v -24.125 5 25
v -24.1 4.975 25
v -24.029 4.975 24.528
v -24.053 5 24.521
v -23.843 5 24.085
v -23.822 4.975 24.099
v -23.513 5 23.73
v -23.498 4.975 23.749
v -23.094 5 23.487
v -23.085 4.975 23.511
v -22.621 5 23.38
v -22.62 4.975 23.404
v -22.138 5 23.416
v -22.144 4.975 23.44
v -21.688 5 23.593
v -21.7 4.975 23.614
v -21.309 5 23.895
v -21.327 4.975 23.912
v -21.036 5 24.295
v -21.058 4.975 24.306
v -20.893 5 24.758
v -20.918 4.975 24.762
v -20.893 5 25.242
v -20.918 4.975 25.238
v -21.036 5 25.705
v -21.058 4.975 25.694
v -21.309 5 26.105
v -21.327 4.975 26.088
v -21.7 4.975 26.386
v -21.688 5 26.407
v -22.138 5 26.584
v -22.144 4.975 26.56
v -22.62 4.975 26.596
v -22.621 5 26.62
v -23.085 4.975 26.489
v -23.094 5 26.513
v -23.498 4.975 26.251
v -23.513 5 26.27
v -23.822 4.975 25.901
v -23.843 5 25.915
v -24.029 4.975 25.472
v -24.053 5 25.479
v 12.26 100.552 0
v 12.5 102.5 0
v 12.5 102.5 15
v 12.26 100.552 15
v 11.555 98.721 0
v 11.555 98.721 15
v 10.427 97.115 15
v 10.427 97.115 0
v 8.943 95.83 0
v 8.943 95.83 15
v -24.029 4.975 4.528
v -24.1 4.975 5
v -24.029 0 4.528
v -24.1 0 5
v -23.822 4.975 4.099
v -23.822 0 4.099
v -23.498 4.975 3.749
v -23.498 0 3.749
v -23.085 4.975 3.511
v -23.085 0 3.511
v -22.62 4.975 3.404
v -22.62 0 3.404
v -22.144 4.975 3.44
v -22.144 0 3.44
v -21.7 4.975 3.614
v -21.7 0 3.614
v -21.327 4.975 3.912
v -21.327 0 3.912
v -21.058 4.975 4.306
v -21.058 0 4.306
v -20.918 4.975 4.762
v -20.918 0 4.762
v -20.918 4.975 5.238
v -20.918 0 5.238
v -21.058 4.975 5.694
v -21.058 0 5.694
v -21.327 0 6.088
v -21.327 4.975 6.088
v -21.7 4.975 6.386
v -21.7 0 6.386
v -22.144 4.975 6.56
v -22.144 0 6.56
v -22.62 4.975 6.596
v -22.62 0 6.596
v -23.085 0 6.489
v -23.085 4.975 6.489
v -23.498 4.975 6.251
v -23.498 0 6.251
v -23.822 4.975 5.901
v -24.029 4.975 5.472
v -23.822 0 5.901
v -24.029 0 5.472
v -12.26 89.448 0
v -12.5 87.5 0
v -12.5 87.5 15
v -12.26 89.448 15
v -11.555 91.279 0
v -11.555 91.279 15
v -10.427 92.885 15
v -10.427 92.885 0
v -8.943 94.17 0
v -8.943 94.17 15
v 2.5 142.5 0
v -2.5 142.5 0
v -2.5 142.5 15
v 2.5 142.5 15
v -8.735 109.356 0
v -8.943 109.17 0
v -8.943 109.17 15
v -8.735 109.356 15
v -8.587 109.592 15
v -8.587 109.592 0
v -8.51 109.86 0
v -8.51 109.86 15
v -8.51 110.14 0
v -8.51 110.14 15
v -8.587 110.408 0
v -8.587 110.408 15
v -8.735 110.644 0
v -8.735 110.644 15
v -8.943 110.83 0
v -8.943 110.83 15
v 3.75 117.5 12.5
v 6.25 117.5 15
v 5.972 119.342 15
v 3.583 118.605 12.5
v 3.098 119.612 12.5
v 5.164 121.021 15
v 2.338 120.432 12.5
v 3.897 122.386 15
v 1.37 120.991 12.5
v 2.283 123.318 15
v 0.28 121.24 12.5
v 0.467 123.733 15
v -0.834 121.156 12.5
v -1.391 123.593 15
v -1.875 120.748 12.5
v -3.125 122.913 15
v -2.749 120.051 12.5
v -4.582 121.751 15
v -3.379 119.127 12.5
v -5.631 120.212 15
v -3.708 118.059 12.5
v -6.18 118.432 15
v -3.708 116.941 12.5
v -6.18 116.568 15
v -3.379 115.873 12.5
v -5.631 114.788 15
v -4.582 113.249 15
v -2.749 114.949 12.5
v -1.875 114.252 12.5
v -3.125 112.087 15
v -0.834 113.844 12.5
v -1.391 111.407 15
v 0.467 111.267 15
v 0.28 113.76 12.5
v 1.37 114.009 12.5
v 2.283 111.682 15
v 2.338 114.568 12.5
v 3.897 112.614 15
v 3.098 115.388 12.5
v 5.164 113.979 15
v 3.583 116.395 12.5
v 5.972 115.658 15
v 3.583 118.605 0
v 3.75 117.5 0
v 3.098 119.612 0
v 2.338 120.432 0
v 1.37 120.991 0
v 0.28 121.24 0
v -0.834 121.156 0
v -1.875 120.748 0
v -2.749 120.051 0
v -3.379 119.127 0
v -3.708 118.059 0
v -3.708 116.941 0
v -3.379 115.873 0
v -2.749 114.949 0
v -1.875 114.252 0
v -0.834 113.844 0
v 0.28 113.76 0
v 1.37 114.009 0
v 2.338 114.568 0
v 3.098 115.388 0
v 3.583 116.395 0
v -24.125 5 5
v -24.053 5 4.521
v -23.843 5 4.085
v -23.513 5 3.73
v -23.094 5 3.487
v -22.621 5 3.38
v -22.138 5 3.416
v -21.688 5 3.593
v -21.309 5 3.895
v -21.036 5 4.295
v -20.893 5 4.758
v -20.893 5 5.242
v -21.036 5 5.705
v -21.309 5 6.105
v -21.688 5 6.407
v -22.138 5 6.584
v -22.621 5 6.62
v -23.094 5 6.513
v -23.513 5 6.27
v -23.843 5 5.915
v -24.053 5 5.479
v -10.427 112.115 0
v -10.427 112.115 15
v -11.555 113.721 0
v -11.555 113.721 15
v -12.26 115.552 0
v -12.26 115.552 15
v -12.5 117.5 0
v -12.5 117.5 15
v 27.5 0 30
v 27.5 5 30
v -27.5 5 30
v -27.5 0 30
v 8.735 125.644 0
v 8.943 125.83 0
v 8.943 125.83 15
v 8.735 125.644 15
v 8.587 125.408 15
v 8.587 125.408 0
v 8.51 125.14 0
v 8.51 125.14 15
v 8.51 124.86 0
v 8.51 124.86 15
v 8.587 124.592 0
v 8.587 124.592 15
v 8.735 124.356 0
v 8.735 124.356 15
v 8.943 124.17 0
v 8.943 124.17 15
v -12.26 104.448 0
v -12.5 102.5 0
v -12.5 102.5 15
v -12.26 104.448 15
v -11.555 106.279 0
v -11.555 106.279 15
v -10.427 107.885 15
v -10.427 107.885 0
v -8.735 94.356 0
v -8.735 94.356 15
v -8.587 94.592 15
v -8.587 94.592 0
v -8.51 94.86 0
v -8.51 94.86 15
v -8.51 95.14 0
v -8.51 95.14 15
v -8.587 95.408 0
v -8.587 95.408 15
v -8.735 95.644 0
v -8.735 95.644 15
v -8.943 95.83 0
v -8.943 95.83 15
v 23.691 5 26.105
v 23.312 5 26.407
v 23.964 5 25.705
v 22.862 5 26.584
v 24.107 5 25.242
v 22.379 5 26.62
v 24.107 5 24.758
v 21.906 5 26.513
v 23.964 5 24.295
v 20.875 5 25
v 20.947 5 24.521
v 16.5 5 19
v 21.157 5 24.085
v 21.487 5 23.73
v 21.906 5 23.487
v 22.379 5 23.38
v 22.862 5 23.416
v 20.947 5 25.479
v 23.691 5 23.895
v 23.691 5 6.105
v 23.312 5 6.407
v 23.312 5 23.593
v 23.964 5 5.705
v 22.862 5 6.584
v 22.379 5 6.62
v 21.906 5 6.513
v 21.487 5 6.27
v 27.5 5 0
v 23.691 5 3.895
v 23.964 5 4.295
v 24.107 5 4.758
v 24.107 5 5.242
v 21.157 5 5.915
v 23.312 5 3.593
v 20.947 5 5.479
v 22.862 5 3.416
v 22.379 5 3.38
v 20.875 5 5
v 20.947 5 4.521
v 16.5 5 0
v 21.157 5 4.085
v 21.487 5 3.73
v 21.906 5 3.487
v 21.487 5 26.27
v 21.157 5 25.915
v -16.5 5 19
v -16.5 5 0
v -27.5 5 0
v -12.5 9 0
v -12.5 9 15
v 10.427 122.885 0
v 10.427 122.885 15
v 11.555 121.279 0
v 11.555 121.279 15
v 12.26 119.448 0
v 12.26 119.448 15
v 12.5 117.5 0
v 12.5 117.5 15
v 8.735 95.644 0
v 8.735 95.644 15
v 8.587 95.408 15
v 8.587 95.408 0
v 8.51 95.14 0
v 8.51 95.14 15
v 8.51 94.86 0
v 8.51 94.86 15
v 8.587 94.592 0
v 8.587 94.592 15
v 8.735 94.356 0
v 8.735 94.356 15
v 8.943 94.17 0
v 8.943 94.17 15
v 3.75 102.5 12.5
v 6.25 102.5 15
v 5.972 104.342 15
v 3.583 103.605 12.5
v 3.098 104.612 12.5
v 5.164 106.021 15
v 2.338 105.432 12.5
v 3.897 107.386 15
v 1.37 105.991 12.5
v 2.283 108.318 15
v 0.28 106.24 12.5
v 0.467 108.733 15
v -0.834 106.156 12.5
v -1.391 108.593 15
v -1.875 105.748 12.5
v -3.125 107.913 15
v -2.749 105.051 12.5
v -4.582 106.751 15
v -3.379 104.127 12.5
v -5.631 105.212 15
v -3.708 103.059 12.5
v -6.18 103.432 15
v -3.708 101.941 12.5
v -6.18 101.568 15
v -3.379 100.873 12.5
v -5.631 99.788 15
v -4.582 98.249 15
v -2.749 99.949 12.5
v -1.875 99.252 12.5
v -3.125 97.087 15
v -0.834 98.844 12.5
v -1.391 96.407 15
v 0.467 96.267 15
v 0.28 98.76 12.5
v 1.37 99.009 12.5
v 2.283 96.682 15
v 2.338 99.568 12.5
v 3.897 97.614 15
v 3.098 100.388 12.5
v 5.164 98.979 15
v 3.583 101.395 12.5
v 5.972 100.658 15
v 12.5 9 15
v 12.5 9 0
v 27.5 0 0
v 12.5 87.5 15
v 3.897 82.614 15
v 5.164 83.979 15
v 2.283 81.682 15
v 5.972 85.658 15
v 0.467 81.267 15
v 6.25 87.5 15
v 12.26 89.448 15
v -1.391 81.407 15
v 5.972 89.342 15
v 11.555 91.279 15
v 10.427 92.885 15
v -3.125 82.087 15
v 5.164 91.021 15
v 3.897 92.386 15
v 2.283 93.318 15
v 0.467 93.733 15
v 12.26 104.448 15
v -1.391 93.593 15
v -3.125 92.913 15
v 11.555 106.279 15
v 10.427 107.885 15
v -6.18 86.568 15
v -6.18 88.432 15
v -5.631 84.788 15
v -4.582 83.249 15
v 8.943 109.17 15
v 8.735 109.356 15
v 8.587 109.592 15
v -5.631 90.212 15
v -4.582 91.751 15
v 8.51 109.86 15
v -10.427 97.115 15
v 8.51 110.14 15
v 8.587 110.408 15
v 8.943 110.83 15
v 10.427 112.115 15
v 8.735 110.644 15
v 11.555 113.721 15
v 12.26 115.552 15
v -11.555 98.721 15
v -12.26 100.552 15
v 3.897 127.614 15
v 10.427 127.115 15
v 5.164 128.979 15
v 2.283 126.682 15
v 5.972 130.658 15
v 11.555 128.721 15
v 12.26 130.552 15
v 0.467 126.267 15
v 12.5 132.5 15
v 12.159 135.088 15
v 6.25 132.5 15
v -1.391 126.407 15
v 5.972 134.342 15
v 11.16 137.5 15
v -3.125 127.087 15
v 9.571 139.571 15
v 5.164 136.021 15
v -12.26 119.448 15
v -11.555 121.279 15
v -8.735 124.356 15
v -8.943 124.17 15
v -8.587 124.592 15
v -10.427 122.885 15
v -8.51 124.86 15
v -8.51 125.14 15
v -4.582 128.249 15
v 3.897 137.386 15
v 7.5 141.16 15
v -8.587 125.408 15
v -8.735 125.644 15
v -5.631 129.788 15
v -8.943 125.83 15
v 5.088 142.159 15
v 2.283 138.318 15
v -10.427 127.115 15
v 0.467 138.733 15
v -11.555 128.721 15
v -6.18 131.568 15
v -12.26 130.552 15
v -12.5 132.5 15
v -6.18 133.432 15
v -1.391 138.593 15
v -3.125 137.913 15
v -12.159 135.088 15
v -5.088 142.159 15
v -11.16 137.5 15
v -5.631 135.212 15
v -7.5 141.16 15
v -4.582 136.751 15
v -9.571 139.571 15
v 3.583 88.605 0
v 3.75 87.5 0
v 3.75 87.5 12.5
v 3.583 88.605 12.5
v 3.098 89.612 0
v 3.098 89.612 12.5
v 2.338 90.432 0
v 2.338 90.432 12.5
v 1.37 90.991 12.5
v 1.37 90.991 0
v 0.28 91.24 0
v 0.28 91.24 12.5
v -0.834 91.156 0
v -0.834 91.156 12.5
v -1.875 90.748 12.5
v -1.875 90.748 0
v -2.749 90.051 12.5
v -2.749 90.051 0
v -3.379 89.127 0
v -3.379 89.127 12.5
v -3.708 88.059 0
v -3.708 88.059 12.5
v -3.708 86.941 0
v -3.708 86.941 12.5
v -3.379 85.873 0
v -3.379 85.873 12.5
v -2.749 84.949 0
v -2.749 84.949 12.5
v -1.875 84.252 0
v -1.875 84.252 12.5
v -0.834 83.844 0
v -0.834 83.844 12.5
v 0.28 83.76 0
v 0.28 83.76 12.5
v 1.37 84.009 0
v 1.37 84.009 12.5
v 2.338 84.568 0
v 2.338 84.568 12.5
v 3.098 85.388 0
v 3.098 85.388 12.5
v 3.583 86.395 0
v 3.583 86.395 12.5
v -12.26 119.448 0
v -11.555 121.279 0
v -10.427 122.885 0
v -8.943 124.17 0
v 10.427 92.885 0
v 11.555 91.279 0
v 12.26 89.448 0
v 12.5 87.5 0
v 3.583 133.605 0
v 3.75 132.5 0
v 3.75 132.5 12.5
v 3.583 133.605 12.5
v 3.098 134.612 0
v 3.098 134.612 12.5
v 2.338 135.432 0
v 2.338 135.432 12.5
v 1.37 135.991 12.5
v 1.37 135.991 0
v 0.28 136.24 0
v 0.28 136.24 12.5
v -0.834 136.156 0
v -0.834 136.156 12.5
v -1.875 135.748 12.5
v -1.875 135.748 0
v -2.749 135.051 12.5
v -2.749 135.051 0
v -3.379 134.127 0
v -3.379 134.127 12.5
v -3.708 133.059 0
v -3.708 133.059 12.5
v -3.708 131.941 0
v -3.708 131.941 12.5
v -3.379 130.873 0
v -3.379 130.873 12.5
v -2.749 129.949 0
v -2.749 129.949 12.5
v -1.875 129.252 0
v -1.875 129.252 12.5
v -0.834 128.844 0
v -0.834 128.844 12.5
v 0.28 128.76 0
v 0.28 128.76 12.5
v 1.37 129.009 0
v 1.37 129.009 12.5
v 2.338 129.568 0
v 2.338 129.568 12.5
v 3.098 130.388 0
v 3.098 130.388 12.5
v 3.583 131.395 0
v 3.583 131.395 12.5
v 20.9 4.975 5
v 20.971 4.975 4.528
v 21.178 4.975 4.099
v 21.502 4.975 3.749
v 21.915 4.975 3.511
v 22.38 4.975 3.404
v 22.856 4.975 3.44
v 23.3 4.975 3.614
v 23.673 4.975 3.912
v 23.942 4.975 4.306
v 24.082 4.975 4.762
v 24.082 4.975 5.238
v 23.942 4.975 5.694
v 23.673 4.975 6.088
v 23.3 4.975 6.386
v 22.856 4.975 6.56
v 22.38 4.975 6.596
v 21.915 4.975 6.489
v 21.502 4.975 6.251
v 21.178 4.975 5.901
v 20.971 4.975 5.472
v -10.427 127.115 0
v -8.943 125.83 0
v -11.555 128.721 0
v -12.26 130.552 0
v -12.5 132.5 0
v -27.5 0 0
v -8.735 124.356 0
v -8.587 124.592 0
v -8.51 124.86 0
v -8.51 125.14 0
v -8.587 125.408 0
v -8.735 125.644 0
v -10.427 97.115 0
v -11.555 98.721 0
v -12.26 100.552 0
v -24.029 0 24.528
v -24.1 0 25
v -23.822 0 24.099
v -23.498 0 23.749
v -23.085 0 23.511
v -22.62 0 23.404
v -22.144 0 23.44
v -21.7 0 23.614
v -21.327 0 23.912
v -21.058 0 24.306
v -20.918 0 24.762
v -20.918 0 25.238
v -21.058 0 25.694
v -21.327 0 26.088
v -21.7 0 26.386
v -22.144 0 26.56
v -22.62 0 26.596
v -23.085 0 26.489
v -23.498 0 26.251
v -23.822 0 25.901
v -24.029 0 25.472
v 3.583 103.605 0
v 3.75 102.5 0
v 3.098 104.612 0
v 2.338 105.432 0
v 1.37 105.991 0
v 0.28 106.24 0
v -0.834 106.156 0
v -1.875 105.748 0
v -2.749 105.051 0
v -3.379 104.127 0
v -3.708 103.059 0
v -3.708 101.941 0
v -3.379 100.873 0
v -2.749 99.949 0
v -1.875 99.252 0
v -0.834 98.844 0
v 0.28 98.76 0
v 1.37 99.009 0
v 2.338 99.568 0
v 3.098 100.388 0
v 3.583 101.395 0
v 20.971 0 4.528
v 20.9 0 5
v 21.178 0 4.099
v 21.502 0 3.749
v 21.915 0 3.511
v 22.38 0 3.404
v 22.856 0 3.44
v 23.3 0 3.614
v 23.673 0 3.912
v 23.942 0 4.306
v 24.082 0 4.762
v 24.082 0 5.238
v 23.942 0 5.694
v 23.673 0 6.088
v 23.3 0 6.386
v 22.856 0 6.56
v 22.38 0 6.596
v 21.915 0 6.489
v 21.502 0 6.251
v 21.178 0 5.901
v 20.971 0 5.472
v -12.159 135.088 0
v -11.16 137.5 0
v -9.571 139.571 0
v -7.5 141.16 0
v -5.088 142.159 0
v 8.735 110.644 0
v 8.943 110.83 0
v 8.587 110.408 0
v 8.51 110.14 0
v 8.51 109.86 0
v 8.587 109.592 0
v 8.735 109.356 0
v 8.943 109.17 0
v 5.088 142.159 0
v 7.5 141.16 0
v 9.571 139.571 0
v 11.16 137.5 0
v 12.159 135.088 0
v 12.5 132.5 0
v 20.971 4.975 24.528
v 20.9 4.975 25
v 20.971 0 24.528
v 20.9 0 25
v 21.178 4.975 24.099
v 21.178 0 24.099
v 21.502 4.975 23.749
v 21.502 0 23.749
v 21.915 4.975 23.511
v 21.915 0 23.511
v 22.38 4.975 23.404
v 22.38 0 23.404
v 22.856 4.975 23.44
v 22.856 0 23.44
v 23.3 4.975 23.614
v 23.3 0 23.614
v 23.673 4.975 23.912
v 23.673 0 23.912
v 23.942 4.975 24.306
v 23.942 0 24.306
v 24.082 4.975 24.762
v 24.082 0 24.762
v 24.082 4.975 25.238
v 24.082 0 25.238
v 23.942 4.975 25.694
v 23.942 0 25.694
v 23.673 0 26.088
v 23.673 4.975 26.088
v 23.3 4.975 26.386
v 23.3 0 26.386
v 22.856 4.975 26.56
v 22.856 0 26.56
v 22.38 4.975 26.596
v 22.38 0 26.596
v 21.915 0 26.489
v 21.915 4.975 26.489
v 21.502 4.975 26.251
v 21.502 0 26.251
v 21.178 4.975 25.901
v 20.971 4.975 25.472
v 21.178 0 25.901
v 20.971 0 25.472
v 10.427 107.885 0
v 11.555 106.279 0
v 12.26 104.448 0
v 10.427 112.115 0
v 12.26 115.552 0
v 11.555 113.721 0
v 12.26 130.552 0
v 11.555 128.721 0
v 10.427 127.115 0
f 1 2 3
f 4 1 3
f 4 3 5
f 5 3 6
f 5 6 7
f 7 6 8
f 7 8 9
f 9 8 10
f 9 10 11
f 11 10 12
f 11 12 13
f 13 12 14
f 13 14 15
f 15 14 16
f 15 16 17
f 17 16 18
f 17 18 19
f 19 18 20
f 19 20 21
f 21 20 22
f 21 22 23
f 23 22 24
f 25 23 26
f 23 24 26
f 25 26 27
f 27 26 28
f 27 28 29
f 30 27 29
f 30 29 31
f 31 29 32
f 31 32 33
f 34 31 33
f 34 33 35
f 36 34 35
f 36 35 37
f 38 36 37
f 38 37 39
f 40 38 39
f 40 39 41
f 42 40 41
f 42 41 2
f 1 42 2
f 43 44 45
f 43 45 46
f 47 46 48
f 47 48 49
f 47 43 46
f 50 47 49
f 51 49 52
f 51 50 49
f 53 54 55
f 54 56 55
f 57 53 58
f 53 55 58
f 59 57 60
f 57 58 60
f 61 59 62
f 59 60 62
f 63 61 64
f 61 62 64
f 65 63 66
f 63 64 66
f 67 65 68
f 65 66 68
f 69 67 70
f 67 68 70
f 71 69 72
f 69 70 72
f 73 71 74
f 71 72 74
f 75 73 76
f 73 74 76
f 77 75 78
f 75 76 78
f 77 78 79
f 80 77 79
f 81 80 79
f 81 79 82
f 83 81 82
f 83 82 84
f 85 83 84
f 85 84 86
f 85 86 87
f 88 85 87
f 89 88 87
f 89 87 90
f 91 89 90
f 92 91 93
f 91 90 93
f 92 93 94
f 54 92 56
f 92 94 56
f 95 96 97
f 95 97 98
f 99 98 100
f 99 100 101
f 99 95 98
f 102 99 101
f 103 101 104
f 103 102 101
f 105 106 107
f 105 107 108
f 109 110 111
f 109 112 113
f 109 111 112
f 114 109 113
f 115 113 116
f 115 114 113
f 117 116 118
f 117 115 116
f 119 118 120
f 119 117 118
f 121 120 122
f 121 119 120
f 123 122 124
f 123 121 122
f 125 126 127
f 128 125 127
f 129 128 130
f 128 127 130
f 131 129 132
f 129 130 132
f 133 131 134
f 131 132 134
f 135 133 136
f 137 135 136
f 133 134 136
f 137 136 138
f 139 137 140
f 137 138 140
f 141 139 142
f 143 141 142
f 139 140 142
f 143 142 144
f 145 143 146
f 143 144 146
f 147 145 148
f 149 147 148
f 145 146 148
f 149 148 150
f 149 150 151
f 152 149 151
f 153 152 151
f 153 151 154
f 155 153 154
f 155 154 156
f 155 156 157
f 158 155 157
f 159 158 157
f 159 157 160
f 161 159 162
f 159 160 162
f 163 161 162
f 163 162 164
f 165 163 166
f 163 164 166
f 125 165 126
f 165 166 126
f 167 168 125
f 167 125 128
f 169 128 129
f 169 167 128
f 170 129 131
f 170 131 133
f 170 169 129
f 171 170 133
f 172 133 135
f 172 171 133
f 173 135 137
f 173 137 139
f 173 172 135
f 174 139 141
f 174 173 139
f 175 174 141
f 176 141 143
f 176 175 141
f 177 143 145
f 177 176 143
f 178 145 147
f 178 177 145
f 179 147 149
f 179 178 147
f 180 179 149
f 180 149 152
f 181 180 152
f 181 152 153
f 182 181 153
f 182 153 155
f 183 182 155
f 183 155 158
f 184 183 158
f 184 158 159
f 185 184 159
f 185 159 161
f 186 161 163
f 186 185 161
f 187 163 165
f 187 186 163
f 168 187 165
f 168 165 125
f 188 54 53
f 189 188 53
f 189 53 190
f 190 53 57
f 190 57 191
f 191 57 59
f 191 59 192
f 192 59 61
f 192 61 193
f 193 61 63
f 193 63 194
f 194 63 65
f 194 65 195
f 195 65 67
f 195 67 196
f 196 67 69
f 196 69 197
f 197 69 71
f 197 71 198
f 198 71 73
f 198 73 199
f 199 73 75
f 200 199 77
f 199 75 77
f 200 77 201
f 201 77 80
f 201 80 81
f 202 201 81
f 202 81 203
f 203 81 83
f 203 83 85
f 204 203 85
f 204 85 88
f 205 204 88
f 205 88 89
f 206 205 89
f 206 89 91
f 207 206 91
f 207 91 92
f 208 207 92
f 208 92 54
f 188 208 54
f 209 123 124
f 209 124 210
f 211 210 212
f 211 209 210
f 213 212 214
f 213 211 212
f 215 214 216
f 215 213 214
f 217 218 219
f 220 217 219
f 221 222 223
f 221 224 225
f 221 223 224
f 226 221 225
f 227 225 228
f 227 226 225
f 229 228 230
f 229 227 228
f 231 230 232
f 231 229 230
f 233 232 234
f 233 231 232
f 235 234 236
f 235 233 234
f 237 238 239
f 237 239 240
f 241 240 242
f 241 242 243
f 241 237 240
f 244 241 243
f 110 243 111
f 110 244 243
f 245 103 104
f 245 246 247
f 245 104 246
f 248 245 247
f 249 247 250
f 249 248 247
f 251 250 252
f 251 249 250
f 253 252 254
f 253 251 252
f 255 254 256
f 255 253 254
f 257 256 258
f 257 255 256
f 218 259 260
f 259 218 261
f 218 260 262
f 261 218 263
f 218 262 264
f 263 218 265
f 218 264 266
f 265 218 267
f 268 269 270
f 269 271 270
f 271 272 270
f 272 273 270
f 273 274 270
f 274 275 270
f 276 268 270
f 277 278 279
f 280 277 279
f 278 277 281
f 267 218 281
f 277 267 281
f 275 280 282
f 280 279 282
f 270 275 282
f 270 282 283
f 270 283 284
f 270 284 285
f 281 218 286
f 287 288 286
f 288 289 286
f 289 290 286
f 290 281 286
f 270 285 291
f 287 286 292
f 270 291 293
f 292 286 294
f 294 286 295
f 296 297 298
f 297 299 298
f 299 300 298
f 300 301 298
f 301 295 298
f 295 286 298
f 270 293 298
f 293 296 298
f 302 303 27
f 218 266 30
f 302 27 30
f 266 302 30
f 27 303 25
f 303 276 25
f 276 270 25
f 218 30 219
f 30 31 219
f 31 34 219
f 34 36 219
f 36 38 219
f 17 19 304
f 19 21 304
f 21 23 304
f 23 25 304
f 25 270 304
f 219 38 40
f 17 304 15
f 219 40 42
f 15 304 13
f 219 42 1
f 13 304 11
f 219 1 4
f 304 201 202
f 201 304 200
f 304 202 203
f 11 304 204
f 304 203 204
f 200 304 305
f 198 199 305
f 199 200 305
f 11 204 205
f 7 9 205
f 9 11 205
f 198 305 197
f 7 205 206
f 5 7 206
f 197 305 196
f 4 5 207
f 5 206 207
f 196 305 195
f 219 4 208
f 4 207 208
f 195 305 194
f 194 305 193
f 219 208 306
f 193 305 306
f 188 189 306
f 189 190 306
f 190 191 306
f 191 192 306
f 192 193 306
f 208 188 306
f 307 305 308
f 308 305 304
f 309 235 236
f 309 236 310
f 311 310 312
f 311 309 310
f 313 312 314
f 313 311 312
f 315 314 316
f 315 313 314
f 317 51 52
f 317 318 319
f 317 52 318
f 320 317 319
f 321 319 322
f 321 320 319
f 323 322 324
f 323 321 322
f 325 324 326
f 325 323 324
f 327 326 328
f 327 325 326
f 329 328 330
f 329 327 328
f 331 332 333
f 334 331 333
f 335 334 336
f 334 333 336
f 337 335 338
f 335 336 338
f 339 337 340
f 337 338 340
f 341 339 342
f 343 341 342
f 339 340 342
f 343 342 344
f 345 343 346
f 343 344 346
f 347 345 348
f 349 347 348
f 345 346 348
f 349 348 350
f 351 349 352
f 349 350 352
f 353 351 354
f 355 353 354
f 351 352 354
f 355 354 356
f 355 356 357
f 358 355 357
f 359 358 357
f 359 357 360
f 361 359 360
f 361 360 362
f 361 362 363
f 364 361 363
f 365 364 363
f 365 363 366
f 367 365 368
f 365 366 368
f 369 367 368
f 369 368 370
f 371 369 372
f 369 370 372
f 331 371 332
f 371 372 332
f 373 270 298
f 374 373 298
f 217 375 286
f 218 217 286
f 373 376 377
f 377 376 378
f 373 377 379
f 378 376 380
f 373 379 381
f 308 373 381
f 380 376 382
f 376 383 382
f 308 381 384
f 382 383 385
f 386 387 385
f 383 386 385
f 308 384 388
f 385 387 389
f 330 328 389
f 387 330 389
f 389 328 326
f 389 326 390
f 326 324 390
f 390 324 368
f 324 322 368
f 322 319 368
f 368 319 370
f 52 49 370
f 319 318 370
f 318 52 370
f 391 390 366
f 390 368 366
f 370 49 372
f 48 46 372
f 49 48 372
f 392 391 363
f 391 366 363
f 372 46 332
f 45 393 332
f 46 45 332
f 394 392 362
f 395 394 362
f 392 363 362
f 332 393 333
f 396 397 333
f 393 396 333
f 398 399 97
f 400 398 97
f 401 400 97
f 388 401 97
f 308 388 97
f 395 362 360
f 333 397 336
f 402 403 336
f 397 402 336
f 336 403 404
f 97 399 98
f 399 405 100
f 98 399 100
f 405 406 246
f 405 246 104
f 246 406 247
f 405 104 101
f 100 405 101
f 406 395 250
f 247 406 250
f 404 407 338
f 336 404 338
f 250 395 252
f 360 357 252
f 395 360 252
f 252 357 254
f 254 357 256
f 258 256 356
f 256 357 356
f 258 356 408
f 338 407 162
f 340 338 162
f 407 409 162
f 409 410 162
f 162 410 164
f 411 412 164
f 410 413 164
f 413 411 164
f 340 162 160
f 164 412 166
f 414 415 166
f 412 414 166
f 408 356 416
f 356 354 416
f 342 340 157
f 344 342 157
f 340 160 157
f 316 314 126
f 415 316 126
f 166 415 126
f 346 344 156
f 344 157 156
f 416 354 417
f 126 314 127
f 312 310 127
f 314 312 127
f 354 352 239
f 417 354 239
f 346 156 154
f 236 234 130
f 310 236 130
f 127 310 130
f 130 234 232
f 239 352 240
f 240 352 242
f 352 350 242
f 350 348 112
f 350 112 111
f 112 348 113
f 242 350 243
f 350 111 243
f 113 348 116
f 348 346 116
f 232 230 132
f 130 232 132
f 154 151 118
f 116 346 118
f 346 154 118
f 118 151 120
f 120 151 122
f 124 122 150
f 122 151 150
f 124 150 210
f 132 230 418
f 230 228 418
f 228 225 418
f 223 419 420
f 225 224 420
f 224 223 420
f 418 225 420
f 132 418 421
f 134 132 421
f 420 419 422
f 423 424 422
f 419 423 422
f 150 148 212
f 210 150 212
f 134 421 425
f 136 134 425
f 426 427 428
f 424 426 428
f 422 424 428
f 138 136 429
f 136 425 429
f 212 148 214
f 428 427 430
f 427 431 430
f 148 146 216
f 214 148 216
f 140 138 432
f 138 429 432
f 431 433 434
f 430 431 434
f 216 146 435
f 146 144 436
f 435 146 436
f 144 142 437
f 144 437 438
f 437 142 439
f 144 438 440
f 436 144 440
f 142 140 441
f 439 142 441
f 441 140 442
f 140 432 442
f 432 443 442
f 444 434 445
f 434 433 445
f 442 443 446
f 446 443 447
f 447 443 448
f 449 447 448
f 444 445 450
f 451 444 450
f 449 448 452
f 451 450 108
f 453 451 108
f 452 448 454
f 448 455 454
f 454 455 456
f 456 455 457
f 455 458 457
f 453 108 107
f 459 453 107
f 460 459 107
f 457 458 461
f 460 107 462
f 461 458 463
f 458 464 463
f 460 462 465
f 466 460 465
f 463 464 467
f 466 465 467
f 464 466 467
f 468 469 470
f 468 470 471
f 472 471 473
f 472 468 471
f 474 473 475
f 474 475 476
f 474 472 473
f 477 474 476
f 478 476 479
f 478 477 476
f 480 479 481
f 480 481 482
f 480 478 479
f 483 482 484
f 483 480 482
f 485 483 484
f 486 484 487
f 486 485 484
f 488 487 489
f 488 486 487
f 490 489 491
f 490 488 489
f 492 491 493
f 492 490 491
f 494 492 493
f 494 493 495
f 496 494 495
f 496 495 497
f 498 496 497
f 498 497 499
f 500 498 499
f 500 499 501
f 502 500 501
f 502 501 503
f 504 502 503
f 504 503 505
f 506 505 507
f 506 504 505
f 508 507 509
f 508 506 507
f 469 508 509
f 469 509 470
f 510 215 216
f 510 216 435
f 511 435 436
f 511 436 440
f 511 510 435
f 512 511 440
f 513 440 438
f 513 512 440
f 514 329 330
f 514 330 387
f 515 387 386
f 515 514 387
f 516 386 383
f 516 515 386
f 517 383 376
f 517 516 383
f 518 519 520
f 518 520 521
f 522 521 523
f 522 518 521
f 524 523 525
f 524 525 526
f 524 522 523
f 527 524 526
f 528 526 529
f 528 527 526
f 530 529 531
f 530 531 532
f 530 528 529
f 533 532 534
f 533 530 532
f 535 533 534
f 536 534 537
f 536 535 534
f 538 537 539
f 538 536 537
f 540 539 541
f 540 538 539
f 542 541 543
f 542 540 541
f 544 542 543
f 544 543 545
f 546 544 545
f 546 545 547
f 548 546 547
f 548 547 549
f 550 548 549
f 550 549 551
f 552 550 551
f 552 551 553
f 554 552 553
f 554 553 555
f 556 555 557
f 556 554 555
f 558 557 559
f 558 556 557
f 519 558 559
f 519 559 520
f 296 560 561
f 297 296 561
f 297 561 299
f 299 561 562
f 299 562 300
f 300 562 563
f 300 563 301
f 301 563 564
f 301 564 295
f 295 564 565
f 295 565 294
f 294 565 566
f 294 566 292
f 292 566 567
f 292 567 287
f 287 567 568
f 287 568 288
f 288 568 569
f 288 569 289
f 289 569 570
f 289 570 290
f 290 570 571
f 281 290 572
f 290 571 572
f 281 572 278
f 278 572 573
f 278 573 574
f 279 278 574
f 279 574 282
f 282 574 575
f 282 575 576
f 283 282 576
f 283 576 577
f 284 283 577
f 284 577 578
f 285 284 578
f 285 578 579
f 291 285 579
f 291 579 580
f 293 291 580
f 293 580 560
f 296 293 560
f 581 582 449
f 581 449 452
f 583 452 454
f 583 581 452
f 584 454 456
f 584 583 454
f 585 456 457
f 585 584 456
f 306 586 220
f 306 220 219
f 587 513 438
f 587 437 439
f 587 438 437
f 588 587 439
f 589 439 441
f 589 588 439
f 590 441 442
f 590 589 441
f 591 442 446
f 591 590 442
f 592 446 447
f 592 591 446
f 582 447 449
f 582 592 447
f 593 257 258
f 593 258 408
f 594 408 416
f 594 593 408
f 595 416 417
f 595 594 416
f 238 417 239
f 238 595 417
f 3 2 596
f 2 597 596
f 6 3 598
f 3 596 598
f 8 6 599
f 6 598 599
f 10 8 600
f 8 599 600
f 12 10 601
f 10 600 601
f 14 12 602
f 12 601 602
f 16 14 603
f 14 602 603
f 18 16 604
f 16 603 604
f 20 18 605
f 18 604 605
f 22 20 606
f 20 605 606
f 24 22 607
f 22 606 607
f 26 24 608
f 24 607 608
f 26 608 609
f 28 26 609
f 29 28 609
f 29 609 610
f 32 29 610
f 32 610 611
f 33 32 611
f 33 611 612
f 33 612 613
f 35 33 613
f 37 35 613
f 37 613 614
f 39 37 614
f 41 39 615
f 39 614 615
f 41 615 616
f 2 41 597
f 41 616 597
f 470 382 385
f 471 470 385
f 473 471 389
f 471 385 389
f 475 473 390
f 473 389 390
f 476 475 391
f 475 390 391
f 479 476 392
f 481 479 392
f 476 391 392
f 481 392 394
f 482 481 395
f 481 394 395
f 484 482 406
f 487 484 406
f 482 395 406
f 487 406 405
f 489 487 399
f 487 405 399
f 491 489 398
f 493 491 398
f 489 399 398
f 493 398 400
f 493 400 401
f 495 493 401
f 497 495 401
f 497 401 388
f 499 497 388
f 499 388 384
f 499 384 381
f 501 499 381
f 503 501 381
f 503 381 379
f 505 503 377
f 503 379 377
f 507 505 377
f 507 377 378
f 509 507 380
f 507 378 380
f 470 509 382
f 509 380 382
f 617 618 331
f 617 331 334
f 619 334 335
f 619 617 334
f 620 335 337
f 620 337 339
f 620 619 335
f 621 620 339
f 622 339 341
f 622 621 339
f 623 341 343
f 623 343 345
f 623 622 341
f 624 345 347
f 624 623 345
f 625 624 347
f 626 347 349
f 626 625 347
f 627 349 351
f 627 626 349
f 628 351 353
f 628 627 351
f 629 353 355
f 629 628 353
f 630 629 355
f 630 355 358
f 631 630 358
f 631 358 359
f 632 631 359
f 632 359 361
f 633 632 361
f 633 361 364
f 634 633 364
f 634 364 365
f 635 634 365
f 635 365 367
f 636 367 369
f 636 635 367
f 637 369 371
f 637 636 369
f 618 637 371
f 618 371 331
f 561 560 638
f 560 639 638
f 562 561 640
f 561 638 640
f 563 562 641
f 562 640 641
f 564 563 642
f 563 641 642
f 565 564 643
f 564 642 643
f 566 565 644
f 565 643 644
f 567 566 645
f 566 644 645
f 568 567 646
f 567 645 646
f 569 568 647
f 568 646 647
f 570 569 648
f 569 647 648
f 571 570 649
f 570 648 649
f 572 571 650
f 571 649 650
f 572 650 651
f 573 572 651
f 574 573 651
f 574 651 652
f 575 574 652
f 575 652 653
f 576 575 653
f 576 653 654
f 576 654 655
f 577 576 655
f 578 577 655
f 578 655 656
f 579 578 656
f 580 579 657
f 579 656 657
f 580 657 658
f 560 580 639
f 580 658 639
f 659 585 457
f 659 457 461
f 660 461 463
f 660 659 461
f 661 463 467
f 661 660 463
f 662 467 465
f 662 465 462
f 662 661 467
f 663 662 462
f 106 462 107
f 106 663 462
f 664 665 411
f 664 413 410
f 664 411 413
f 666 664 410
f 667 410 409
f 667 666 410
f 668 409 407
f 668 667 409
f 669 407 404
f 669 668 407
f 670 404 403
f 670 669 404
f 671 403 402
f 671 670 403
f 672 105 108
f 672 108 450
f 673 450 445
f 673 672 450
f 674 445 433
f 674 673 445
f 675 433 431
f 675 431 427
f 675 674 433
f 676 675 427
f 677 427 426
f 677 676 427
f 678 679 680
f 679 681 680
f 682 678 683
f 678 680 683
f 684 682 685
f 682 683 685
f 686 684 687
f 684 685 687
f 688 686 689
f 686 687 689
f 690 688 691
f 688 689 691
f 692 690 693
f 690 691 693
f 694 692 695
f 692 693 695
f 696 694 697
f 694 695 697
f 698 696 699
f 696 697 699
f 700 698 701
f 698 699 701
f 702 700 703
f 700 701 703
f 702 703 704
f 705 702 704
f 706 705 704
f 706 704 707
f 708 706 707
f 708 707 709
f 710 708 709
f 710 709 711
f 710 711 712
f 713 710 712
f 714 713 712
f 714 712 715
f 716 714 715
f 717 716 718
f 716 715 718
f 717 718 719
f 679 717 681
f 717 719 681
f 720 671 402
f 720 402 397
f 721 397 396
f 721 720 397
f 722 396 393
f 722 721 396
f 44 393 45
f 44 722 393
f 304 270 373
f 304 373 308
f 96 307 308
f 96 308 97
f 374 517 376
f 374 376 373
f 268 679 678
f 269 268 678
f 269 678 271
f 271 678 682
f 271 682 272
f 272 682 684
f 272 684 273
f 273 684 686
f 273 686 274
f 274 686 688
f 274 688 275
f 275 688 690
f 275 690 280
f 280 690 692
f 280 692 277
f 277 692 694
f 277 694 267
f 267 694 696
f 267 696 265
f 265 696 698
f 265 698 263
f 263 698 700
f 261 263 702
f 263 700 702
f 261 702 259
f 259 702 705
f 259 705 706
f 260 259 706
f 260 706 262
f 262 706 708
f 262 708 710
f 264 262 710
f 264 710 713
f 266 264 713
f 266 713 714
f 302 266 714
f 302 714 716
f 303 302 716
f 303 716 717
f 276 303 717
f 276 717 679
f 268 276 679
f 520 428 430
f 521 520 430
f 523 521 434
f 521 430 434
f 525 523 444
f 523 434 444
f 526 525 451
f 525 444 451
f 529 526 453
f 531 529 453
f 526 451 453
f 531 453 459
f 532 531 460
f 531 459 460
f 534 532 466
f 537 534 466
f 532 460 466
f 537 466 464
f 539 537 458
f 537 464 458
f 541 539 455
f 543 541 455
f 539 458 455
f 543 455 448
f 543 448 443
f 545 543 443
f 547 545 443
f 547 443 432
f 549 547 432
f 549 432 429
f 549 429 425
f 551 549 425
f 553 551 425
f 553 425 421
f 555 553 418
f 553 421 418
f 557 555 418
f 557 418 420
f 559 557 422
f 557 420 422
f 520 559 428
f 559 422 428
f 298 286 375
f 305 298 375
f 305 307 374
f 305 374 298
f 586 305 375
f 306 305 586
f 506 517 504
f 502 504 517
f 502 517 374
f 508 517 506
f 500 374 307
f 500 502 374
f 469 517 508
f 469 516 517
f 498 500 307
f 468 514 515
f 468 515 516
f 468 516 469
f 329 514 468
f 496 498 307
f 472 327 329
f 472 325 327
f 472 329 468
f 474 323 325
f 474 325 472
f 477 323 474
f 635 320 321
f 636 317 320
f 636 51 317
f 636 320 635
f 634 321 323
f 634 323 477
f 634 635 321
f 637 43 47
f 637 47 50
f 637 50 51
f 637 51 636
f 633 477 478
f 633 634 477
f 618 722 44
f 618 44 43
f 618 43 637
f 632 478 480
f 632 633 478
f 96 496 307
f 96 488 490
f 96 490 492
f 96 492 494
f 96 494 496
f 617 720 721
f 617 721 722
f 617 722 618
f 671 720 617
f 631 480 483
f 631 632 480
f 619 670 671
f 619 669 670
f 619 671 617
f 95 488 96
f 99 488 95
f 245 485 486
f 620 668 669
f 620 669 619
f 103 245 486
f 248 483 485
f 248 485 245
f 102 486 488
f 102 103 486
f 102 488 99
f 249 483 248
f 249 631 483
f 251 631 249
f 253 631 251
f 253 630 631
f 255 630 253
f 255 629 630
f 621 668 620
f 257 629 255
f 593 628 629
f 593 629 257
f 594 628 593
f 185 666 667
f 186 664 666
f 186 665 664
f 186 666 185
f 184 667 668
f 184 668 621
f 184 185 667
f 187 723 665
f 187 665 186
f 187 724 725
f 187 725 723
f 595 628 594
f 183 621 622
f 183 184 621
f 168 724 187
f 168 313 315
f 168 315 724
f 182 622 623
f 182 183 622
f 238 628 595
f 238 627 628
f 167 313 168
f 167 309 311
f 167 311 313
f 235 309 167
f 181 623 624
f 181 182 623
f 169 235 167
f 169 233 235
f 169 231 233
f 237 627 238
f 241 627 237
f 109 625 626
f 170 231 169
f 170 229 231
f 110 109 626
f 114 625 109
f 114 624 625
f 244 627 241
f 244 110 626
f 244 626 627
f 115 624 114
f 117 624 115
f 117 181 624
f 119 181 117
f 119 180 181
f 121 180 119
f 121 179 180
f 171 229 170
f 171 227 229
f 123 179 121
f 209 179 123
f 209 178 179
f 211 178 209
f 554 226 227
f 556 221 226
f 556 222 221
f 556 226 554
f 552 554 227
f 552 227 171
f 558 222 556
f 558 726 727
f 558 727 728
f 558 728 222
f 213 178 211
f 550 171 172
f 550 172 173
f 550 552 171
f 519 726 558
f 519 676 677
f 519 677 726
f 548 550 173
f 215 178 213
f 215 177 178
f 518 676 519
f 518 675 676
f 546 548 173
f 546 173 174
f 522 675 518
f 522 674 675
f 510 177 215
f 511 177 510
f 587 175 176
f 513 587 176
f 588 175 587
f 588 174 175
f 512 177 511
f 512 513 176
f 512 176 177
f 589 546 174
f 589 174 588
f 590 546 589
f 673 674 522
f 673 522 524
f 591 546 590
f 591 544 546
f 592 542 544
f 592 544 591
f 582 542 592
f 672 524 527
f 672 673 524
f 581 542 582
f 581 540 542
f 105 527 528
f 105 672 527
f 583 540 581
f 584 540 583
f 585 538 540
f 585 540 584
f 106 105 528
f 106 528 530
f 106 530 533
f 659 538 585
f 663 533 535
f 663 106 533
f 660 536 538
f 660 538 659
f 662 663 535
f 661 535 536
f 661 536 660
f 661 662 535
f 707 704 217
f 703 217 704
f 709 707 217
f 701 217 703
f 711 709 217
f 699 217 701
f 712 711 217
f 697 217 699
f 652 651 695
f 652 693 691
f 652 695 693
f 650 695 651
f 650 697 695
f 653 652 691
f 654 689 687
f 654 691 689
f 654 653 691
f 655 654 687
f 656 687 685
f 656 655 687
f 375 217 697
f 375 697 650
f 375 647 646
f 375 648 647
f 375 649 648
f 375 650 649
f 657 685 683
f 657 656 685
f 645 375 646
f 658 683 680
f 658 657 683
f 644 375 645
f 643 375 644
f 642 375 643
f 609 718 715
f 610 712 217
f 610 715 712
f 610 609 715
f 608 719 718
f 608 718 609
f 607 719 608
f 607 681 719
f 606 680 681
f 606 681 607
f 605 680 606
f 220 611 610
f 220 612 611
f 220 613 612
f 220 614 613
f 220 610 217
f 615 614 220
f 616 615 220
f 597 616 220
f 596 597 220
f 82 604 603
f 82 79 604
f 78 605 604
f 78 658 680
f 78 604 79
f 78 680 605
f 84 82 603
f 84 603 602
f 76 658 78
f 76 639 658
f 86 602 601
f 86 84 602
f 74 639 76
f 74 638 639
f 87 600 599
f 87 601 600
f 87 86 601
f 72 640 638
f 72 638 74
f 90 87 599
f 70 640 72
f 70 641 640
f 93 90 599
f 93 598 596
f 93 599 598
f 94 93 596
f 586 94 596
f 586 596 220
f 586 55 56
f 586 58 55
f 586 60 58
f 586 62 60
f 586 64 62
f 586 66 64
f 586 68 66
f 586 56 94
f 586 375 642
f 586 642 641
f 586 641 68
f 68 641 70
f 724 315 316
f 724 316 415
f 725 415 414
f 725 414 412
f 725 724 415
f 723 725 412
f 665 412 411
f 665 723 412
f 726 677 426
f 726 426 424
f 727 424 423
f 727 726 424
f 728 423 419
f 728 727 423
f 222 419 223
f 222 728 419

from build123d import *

# Parameters (mm, degrees)
SKETCH1_R                            = 3.75
BOSS_EXTRUDE1_DEPTH                  = 15
SKETCH2_W                            = 55
SKETCH2_H                            = 5
BOSS_EXTRUDE2_DEPTH                  = 30
F_3_2_3_2_DIAMETER_HOLE1_D           = 3.2
F_3_2_3_2_DIAMETER_HOLE1_CSINK_D     = 3.25
F_3_2_3_2_DIAMETER_HOLE1_CSINK_ANGLE = 90
CHAMFER1_SIZE                        = 4
CUT_EXTRUDE1_DEPTH                   = 146.902364614
CUT_EXTRUDE1_DEPTH_BACK              = 146.902364614
CHAMFER2_SIZE                        = 2.5


with BuildPart() as part:
    # Sketch1 → Boss-Extrude1 (new body)
    with BuildSketch(Plane.XY):
        Polygon((0, 0), (-12.5, 0), (-12.5, 142.5), (12.5, 142.5), (12.5, 0), align=None)
        with Locations((0, 132.5)):
            Circle(SKETCH1_R, mode=Mode.SUBTRACT)
        with Locations((0, 117.5)):
            Circle(SKETCH1_R, mode=Mode.SUBTRACT)
        with Locations((0, 102.5)):
            Circle(SKETCH1_R, mode=Mode.SUBTRACT)
        with Locations((0, 87.5)):
            Circle(SKETCH1_R, mode=Mode.SUBTRACT)
    extrude(amount=BOSS_EXTRUDE1_DEPTH)

    # Sketch2 → Boss-Extrude2 (add)
    with BuildSketch(Plane(origin=(0, 0, 0), x_dir=(-1, 0, 0), z_dir=(0, 0, -1))):
        with Locations((0, 2.5)):
            Rectangle(SKETCH2_W, SKETCH2_H)
    extrude(amount=-BOSS_EXTRUDE2_DEPTH)

    # Ø3.2 (3.2) Diameter Hole1 (through all)
    with Locations(Plane(origin=(0, 5, 0), x_dir=(1, 0, 0), z_dir=(0, 1, 0))):
        with Locations((-22.5, -5), (-22.5, -25), (22.5, -25), (22.5, -5)):
            CounterSinkHole(F_3_2_3_2_DIAMETER_HOLE1_D / 2, F_3_2_3_2_DIAMETER_HOLE1_CSINK_D / 2, counter_sink_angle=F_3_2_3_2_DIAMETER_HOLE1_CSINK_ANGLE)

    # Chamfer1
    chamfer1_edges = [part.edges().sort_by_distance(p)[0] for p in [
        (-12.5, 5, 7.5),
        (0, 5, 15),
        (12.5, 5, 7.5),
    ]]
    chamfer(chamfer1_edges, length=CHAMFER1_SIZE)

    # Sketch6 → Cut-Extrude1 (cut, two sides: drawn at the far end of the back side and taken through both)
    with BuildSketch(Plane.XY.offset(15).offset(-CUT_EXTRUDE1_DEPTH_BACK)):
        with BuildLine():
            ThreePointArc((-8.942906574, 110.830449827), (-11.555147059, 113.720588235), (-12.5, 117.5))
            Line((-12.5, 117.5), (-12.5, 102.5))
            ThreePointArc((-12.5, 102.5), (-11.555147059, 106.279411765), (-8.942906574, 109.169550173))
            ThreePointArc((-8.942906574, 109.169550173), (-8.5, 110), (-8.942906574, 110.830449827))
        make_face()
        with BuildLine():
            Line((12.5, 87.5), (12.5, 102.5))
            ThreePointArc((12.5, 102.5), (11.555147059, 98.720588235), (8.942906574, 95.830449827))
            ThreePointArc((8.942906574, 95.830449827), (8.5, 95), (8.942906574, 94.169550173))
            ThreePointArc((8.942906574, 94.169550173), (11.555147059, 91.279411765), (12.5, 87.5))
        make_face()
        with BuildLine():
            Line((12.5, 102.5), (12.5, 117.5))
            ThreePointArc((12.5, 117.5), (11.555147059, 113.720588235), (8.942906574, 110.830449827))
            ThreePointArc((8.942906574, 110.830449827), (8.5, 110), (8.942906574, 109.169550173))
            ThreePointArc((8.942906574, 109.169550173), (11.555147059, 106.279411765), (12.5, 102.5))
        make_face()
        with BuildLine():
            Line((12.5, 117.5), (12.5, 132.5))
            ThreePointArc((12.5, 132.5), (11.555147059, 128.720588235), (8.942906574, 125.830449827))
            ThreePointArc((8.942906574, 125.830449827), (8.5, 125), (8.942906574, 124.169550173))
            ThreePointArc((8.942906574, 124.169550173), (11.555147059, 121.279411765), (12.5, 117.5))
        make_face()
        with BuildLine():
            Line((12.5, 142.5), (2.5, 142.5))
            ThreePointArc((2.5, 142.5), (9.571067812, 139.571067812), (12.5, 132.5))
            Line((12.5, 132.5), (12.5, 142.5))
        make_face()
        with BuildLine():
            Line((-12.5, 142.5), (-12.5, 132.5))
            ThreePointArc((-12.5, 132.5), (-9.571067812, 139.571067812), (-2.5, 142.5))
            Line((-2.5, 142.5), (-12.5, 142.5))
        make_face()
        with BuildLine():
            ThreePointArc((-8.942906574, 125.830449827), (-11.555147059, 128.720588235), (-12.5, 132.5))
            Line((-12.5, 132.5), (-12.5, 117.5))
            ThreePointArc((-12.5, 117.5), (-11.555147059, 121.279411765), (-8.942906574, 124.169550173))
            ThreePointArc((-8.942906574, 124.169550173), (-8.5, 125), (-8.942906574, 125.830449827))
        make_face()
        with BuildLine():
            Line((-12.5, 102.5), (-12.5, 87.5))
            ThreePointArc((-12.5, 87.5), (-11.555147059, 91.279411765), (-8.942906574, 94.169550173))
            ThreePointArc((-8.942906574, 94.169550173), (-8.5, 95), (-8.942906574, 95.830449827))
            ThreePointArc((-8.942906574, 95.830449827), (-11.555147059, 98.720588235), (-12.5, 102.5))
        make_face()
    extrude(amount=CUT_EXTRUDE1_DEPTH + CUT_EXTRUDE1_DEPTH_BACK, mode=Mode.SUBTRACT)

    # Chamfer2
    chamfer2_edges = [part.edges().sort_by_distance(p)[0] for p in [
        (-3.75, 117.5, 15),
        (-3.75, 102.5, 15),
        (-3.75, 132.5, 15),
        (-3.75, 87.5, 15),
    ]]
    chamfer(chamfer2_edges, length=CHAMFER2_SIZE)


solid = part.part
